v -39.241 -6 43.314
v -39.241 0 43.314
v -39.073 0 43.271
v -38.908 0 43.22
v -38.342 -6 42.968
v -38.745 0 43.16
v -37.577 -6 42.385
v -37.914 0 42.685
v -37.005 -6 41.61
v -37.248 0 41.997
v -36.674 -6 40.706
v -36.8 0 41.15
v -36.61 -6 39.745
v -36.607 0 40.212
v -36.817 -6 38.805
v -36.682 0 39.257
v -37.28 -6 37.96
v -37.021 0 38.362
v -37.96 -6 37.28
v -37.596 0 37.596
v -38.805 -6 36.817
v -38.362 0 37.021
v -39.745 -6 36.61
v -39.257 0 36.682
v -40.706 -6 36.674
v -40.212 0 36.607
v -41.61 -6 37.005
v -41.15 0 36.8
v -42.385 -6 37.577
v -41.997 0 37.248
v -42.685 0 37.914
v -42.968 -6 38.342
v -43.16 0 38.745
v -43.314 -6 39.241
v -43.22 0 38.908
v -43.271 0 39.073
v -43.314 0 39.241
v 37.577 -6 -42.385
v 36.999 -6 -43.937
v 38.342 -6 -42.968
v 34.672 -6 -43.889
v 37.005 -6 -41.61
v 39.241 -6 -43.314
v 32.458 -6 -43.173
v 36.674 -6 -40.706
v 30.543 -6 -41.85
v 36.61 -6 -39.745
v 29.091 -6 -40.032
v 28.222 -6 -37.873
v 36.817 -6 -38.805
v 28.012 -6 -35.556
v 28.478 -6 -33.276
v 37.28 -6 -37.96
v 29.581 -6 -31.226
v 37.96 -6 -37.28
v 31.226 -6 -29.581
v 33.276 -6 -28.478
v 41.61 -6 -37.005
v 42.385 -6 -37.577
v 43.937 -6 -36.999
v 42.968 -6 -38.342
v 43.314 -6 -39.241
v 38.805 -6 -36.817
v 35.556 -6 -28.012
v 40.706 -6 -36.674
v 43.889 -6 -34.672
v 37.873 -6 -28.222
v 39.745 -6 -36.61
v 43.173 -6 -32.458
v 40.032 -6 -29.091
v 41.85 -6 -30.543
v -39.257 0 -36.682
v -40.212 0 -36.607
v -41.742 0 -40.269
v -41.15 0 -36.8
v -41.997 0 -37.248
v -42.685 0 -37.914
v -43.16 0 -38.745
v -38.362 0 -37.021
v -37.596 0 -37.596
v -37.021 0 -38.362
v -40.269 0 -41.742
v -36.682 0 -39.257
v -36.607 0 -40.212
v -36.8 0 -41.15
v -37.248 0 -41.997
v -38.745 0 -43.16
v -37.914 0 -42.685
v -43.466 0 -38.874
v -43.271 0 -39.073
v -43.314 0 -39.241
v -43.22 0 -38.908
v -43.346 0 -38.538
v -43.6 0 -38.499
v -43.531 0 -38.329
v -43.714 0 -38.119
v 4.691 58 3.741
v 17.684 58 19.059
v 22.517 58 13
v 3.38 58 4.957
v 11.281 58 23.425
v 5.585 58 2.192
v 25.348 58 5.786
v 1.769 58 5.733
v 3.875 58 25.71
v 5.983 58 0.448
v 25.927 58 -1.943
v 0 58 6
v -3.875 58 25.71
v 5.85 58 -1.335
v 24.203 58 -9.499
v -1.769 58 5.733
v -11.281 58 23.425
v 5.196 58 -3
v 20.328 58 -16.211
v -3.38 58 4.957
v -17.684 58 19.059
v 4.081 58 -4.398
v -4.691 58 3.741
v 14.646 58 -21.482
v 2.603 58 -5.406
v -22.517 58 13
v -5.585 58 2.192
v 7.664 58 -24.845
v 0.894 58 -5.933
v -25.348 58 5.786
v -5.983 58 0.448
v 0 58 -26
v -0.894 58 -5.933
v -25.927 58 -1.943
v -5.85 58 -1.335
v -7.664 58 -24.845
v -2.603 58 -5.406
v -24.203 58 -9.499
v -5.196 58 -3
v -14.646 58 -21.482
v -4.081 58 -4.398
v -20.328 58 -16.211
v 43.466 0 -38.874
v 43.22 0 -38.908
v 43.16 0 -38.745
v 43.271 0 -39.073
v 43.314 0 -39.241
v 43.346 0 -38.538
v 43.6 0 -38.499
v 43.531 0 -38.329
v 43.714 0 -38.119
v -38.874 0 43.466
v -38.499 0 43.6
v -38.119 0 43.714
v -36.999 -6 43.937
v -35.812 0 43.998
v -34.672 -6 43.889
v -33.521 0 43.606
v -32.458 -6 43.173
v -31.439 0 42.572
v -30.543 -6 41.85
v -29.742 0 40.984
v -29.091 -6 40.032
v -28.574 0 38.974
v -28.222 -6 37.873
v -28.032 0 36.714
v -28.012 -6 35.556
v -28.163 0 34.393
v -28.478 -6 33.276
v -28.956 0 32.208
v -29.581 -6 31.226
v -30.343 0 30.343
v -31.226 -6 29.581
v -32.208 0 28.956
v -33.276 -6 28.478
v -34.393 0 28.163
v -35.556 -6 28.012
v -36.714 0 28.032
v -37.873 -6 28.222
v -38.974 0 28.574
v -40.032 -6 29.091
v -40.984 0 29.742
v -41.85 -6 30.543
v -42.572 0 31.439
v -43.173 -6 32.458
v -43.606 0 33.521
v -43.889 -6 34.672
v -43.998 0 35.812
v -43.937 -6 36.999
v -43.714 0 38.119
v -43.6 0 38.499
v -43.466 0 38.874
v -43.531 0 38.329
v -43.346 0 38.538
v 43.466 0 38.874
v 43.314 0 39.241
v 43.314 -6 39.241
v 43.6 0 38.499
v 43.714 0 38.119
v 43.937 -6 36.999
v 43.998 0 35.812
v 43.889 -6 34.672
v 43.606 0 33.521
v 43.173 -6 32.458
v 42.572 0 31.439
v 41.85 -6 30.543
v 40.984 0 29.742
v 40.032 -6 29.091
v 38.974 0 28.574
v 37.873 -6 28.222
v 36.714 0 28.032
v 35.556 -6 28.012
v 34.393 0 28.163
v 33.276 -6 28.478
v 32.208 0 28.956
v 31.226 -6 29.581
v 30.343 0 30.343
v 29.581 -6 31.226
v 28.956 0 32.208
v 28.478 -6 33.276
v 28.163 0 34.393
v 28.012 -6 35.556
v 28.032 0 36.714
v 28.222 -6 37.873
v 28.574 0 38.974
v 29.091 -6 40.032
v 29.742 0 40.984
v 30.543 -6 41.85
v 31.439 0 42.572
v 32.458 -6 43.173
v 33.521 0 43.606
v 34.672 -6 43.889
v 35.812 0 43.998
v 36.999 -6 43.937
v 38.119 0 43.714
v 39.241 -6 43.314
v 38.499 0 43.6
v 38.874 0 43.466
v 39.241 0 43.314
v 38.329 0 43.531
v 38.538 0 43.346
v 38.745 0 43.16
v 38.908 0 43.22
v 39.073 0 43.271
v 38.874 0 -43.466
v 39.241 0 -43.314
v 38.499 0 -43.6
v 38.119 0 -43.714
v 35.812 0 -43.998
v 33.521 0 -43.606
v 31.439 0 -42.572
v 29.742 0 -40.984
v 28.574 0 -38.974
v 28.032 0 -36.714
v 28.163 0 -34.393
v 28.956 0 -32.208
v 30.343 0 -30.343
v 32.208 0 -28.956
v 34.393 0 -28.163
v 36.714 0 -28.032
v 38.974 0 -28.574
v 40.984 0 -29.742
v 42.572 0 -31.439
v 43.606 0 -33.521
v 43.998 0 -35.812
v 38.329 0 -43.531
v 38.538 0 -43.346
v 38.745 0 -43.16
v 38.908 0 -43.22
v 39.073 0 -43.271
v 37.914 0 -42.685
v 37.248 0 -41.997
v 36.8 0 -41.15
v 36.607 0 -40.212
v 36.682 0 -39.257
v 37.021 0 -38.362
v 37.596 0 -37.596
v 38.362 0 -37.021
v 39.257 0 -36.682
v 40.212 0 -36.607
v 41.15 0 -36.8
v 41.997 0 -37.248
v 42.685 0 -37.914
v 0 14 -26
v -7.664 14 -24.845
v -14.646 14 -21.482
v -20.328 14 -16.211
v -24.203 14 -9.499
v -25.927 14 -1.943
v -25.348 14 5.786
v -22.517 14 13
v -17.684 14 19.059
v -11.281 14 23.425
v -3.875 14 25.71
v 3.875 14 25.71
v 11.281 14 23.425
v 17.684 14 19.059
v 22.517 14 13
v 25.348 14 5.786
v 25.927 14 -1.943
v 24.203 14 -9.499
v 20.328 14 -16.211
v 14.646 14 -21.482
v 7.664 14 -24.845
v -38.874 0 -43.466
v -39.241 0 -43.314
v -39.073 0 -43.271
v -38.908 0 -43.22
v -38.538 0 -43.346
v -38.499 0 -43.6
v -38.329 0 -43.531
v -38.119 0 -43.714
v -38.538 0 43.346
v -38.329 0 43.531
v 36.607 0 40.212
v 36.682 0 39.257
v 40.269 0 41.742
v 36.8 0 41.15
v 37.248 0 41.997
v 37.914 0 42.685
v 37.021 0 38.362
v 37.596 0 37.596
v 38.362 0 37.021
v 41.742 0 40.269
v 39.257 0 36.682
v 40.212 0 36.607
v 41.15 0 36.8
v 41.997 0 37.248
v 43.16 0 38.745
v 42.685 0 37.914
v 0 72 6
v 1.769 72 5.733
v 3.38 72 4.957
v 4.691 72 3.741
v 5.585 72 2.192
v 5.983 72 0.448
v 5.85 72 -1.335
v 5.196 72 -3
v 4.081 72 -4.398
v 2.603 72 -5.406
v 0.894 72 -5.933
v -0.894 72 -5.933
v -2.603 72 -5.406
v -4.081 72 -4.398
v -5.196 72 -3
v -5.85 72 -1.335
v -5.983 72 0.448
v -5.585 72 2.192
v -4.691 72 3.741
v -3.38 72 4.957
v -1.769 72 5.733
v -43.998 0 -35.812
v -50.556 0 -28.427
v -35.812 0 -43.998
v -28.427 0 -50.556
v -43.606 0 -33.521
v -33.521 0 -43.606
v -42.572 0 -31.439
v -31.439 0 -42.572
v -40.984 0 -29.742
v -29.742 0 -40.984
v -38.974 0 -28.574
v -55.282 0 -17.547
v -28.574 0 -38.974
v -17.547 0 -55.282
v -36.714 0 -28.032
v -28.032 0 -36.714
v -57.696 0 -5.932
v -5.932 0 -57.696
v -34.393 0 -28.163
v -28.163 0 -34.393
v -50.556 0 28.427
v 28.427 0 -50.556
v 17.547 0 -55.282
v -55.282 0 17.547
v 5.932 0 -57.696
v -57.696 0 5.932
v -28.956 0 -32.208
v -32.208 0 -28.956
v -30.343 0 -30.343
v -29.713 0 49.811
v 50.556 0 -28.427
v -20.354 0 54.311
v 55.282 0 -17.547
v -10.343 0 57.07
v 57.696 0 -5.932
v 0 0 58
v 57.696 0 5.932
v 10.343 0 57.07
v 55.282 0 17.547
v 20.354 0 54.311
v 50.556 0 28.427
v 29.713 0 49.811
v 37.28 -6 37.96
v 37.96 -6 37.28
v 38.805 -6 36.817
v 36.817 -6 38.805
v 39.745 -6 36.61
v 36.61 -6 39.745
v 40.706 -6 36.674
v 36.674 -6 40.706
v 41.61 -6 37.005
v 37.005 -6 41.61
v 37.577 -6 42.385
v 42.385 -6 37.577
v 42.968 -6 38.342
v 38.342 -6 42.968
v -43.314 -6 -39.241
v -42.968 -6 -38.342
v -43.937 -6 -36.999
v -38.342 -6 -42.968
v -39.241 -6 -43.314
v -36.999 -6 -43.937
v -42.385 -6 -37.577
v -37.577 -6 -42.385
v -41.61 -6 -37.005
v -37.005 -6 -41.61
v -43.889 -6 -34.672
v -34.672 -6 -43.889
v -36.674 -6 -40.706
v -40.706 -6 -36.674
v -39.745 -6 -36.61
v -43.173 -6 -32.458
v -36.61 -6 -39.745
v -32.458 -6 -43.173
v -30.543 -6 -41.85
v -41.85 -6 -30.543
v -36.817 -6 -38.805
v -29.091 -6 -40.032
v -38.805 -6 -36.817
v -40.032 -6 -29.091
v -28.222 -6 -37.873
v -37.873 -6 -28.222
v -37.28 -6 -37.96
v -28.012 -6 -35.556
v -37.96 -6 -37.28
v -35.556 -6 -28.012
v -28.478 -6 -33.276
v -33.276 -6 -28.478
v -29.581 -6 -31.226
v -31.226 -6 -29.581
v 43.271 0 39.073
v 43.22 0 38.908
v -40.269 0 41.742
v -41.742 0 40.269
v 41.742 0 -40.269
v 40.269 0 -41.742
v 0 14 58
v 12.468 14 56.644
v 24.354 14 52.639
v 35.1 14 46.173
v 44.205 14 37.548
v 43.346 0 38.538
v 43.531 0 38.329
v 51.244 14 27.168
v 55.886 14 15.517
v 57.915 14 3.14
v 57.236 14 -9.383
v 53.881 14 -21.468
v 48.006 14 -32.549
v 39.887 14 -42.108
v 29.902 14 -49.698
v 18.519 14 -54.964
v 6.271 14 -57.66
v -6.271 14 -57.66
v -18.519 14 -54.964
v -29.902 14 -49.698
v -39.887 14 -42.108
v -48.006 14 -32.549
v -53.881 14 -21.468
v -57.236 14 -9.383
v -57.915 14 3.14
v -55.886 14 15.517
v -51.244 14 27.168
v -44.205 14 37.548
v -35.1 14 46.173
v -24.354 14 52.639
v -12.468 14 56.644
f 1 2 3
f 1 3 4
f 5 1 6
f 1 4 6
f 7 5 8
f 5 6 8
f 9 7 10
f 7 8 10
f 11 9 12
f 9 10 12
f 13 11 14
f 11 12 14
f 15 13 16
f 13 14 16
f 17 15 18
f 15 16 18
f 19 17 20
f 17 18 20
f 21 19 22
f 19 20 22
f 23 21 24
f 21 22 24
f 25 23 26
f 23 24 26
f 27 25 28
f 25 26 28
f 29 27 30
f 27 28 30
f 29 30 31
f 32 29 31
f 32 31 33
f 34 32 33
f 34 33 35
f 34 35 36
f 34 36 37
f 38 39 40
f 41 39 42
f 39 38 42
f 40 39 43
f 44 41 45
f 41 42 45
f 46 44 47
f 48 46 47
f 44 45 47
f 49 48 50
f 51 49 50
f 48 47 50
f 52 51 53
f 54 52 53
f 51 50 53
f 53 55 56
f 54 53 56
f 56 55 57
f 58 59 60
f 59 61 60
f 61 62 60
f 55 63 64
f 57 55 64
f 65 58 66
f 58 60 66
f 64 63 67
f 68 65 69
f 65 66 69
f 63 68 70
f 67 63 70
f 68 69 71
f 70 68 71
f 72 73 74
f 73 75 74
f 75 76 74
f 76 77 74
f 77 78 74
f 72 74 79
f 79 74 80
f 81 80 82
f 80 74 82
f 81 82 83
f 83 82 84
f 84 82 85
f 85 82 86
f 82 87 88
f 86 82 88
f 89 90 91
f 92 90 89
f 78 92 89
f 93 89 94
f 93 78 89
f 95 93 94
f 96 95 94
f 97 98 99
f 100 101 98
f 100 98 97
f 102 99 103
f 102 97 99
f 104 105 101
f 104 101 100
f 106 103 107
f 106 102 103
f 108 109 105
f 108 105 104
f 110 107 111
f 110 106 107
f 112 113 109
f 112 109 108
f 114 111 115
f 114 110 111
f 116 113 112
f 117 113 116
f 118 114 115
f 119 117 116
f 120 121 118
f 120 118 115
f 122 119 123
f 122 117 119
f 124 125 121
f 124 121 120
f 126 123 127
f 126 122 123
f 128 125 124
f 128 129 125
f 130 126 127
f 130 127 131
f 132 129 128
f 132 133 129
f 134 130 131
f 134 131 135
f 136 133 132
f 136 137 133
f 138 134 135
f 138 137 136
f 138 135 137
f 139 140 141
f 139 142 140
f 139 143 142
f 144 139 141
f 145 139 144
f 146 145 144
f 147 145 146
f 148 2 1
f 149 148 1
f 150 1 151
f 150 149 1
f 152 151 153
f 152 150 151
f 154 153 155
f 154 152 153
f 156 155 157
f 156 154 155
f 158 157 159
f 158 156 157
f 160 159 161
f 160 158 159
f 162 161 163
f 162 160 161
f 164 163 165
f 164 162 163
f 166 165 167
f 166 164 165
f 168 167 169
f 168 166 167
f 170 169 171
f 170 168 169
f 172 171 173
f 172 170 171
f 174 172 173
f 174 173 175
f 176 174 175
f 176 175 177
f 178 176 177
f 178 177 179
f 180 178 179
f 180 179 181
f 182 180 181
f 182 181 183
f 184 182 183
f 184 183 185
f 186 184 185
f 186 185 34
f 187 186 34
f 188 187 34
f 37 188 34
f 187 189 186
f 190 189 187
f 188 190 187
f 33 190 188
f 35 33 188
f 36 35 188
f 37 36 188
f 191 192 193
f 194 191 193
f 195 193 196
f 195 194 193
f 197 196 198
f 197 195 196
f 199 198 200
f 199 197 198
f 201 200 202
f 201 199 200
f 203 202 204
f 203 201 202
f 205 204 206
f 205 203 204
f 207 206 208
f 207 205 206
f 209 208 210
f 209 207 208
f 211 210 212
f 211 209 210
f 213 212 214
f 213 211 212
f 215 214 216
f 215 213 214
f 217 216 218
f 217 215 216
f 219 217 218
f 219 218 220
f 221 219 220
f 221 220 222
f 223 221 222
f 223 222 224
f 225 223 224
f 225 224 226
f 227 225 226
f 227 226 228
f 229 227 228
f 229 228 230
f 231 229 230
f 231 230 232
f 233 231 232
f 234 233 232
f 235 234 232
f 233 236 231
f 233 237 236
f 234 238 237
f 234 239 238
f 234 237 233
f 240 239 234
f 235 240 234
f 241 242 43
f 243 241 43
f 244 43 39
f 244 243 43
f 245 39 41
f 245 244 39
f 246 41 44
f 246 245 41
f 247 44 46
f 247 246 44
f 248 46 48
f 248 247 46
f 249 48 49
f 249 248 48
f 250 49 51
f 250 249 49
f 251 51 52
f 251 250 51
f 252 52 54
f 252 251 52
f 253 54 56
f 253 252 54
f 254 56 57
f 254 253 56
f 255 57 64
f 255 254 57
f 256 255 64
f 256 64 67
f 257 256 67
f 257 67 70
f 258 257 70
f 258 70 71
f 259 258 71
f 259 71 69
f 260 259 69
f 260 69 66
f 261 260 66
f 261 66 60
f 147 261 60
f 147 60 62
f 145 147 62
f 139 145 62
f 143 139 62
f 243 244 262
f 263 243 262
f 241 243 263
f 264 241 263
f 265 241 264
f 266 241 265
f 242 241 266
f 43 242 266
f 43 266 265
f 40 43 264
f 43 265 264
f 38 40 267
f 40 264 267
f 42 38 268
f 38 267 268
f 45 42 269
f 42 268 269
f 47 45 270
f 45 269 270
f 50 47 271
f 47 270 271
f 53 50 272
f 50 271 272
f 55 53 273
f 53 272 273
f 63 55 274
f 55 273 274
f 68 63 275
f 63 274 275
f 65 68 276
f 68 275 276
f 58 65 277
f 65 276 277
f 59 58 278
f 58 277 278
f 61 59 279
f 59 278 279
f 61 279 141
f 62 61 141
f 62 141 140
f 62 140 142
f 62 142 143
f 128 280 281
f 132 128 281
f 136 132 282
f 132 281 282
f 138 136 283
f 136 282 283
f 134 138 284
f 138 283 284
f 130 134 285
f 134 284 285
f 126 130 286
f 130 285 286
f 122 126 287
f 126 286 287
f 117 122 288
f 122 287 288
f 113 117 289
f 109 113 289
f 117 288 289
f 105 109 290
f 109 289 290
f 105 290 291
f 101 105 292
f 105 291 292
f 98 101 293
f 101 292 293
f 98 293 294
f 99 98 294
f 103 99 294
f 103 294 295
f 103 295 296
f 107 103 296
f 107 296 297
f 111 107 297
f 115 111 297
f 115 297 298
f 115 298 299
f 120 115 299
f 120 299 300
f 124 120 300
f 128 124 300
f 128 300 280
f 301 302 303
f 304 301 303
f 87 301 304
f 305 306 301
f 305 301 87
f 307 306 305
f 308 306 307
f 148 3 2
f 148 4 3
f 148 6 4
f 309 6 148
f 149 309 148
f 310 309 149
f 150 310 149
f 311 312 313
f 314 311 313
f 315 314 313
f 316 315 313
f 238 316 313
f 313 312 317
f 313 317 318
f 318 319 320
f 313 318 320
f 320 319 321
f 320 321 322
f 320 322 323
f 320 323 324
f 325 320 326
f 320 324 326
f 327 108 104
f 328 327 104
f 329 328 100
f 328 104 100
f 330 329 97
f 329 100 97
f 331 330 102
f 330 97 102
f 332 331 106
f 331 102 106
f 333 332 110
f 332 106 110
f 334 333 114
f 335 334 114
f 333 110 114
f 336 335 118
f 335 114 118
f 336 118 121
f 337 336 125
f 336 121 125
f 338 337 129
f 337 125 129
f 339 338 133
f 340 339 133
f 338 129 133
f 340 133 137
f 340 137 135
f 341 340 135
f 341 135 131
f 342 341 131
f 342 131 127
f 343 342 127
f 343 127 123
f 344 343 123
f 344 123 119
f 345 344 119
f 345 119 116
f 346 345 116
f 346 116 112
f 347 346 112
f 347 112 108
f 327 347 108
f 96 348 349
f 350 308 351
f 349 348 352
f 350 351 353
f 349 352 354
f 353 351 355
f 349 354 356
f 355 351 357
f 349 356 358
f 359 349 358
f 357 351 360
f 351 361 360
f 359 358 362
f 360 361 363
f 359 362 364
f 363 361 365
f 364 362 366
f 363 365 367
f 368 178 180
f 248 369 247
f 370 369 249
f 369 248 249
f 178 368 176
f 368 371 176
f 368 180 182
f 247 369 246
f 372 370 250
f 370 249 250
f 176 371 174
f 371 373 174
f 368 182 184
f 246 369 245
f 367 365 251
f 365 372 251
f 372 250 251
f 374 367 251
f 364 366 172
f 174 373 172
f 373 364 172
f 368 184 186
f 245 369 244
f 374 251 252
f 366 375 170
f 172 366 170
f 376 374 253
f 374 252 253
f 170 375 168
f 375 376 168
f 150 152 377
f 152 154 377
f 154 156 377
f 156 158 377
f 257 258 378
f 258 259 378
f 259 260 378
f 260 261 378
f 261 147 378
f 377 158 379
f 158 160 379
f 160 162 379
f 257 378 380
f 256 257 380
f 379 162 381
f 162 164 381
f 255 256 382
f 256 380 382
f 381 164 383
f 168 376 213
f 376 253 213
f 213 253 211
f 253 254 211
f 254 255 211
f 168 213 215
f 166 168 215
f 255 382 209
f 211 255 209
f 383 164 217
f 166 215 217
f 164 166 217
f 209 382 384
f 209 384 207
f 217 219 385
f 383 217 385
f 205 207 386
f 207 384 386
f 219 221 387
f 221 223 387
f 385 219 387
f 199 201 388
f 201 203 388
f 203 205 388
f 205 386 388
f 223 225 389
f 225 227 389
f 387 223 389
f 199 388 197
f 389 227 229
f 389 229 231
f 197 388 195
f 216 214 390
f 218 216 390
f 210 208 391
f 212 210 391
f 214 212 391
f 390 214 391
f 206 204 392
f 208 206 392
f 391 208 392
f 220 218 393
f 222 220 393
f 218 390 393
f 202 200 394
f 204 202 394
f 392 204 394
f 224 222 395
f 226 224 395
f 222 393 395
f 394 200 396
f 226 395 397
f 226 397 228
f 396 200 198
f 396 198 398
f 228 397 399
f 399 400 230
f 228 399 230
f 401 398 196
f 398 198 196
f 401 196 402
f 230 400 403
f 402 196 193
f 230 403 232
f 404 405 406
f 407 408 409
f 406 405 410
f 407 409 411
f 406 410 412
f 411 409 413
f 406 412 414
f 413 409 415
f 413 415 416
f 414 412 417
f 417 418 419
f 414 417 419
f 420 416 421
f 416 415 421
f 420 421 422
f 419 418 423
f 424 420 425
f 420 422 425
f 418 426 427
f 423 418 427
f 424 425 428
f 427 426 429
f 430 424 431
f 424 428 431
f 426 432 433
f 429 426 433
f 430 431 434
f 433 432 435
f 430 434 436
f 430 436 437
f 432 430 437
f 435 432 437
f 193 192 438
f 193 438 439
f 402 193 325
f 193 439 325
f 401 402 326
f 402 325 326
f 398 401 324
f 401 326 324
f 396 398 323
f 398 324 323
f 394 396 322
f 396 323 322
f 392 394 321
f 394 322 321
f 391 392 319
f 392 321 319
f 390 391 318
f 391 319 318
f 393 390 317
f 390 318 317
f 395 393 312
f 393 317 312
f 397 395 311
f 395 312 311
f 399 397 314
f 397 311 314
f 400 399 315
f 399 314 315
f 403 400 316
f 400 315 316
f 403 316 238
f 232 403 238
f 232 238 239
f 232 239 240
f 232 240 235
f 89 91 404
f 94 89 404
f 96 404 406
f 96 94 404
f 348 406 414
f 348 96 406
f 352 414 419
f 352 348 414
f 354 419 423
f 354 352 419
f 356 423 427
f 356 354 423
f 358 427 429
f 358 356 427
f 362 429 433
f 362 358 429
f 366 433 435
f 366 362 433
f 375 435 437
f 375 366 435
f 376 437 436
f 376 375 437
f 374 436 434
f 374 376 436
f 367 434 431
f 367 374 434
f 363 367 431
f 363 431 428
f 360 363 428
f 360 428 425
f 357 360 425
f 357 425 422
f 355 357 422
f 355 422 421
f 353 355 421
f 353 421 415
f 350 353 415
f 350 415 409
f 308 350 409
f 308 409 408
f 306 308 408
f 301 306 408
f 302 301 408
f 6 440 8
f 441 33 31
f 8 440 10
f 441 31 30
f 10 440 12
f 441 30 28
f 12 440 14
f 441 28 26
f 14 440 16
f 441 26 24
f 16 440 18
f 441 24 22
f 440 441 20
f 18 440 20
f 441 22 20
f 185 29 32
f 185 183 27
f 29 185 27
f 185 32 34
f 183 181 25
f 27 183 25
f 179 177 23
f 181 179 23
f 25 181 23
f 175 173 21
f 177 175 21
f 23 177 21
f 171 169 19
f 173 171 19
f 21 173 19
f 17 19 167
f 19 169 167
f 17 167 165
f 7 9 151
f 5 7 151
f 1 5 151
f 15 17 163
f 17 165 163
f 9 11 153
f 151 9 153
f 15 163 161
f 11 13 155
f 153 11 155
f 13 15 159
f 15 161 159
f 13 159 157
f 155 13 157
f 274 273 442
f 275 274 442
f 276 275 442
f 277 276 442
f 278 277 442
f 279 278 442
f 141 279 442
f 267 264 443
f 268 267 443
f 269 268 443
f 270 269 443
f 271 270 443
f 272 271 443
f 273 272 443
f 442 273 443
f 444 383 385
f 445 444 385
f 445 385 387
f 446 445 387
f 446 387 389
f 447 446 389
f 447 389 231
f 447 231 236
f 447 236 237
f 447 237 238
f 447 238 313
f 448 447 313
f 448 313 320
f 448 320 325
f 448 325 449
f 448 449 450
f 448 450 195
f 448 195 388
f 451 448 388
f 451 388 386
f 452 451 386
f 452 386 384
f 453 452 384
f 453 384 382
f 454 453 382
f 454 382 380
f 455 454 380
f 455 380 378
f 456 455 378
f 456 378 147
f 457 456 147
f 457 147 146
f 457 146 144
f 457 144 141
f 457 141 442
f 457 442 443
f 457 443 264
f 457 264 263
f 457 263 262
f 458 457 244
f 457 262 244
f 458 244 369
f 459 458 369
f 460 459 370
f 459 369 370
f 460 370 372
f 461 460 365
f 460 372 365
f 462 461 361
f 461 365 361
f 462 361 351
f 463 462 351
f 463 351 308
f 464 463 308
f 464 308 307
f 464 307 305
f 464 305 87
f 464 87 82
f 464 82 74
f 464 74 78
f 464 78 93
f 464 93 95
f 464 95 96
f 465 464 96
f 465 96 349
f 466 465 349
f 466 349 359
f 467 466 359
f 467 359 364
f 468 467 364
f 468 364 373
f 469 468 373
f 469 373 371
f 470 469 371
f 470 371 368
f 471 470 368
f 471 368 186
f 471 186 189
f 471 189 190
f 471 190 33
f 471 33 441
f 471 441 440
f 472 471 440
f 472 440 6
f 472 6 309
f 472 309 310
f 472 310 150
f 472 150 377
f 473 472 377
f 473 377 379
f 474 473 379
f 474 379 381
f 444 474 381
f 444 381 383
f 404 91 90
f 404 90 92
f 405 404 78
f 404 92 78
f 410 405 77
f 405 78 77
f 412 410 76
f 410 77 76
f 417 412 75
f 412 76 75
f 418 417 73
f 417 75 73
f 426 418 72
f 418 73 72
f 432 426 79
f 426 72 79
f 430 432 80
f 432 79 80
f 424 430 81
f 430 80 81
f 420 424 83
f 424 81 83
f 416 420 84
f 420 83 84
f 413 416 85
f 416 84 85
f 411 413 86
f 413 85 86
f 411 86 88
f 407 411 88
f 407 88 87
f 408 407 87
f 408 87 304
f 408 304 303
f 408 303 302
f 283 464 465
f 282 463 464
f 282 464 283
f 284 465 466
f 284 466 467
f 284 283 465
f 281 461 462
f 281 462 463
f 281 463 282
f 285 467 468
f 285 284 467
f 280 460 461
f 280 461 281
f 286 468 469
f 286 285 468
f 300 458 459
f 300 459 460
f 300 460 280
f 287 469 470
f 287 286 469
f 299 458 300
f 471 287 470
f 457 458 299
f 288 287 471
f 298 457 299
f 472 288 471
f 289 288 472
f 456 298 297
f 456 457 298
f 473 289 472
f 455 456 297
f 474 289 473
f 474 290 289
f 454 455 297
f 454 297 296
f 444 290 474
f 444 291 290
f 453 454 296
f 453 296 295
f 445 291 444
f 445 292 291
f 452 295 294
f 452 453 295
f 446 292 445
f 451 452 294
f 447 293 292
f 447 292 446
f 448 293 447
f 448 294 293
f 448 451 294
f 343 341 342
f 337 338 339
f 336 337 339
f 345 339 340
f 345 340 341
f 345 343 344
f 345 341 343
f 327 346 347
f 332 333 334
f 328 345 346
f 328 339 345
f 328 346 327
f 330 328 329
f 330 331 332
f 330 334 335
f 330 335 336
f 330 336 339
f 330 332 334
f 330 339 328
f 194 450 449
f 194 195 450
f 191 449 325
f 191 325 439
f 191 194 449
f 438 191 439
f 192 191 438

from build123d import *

# Parameters (mm, degrees)
SKETCH1_R           = 58
BOSS_EXTRUDE1_DEPTH = 14
SKETCH2_R           = 8
BOSS_EXTRUDE2_DEPTH = 6
SKETCH3_R           = 26
BOSS_EXTRUDE3_DEPTH = 58
SKETCH4_R           = 6
BOSS_EXTRUDE4_DEPTH = 72
SKETCH5_R           = 3.4
CUT_EXTRUDE1_DEPTH  = 110.142109197


with BuildPart() as part:
    # Sketch1 → Boss-Extrude1 (new body)
    with BuildSketch(Plane(origin=(0, 0, 0), x_dir=(1, 0, 0), z_dir=(0, 1, 0))):
        with Locations(Location((0, 0, 0), (0, 0, 270))):
            Circle(SKETCH1_R)
    extrude(amount=BOSS_EXTRUDE1_DEPTH)

    # Sketch2 → Boss-Extrude2 (add)
    with BuildSketch(Plane(origin=(0, 0, 0), x_dir=(1, 0, 0), z_dir=(0, 1, 0))):
        with Locations(Location((-36, -36, 0), (0, 0, 270))):
            Circle(SKETCH2_R)
        with Locations(Location((36, -36, 0), (0, 0, 270))):
            Circle(SKETCH2_R)
        with Locations(Location((-36, 36, 0), (0, 0, 270))):
            Circle(SKETCH2_R)
        with Locations(Location((36, 36, 0), (0, 0, 270))):
            Circle(SKETCH2_R)
    extrude(amount=-BOSS_EXTRUDE2_DEPTH)

    # Sketch3 → Boss-Extrude3 (add)
    with BuildSketch(Plane(origin=(0, 0, 0), x_dir=(1, 0, 0), z_dir=(0, 1, 0))):
        with Locations(Location((0, 0, 0), (0, 0, 90))):
            Circle(SKETCH3_R)
    extrude(amount=BOSS_EXTRUDE3_DEPTH)

    # Sketch4 → Boss-Extrude4 (add)
    with BuildSketch(Plane(origin=(0, 0, 0), x_dir=(1, 0, 0), z_dir=(0, 1, 0))):
        with Locations(Location((0, 0, 0), (0, 0, 270))):
            Circle(SKETCH4_R)
    extrude(amount=BOSS_EXTRUDE4_DEPTH)

    # Sketch5 → Cut-Extrude1 (cut, through all)
    with BuildSketch(Plane(origin=(0, 0, 0), x_dir=(1, 0, 0), z_dir=(0, 1, 0))):
        with Locations((-40, -40)):
            Circle(SKETCH5_R)
        with Locations((40, -40)):
            Circle(SKETCH5_R)
        with Locations((-40, 40)):
            Circle(SKETCH5_R)
        with Locations((40, 40)):
            Circle(SKETCH5_R)
    extrude(amount=-CUT_EXTRUDE1_DEPTH, mode=Mode.SUBTRACT)


solid = part.part
